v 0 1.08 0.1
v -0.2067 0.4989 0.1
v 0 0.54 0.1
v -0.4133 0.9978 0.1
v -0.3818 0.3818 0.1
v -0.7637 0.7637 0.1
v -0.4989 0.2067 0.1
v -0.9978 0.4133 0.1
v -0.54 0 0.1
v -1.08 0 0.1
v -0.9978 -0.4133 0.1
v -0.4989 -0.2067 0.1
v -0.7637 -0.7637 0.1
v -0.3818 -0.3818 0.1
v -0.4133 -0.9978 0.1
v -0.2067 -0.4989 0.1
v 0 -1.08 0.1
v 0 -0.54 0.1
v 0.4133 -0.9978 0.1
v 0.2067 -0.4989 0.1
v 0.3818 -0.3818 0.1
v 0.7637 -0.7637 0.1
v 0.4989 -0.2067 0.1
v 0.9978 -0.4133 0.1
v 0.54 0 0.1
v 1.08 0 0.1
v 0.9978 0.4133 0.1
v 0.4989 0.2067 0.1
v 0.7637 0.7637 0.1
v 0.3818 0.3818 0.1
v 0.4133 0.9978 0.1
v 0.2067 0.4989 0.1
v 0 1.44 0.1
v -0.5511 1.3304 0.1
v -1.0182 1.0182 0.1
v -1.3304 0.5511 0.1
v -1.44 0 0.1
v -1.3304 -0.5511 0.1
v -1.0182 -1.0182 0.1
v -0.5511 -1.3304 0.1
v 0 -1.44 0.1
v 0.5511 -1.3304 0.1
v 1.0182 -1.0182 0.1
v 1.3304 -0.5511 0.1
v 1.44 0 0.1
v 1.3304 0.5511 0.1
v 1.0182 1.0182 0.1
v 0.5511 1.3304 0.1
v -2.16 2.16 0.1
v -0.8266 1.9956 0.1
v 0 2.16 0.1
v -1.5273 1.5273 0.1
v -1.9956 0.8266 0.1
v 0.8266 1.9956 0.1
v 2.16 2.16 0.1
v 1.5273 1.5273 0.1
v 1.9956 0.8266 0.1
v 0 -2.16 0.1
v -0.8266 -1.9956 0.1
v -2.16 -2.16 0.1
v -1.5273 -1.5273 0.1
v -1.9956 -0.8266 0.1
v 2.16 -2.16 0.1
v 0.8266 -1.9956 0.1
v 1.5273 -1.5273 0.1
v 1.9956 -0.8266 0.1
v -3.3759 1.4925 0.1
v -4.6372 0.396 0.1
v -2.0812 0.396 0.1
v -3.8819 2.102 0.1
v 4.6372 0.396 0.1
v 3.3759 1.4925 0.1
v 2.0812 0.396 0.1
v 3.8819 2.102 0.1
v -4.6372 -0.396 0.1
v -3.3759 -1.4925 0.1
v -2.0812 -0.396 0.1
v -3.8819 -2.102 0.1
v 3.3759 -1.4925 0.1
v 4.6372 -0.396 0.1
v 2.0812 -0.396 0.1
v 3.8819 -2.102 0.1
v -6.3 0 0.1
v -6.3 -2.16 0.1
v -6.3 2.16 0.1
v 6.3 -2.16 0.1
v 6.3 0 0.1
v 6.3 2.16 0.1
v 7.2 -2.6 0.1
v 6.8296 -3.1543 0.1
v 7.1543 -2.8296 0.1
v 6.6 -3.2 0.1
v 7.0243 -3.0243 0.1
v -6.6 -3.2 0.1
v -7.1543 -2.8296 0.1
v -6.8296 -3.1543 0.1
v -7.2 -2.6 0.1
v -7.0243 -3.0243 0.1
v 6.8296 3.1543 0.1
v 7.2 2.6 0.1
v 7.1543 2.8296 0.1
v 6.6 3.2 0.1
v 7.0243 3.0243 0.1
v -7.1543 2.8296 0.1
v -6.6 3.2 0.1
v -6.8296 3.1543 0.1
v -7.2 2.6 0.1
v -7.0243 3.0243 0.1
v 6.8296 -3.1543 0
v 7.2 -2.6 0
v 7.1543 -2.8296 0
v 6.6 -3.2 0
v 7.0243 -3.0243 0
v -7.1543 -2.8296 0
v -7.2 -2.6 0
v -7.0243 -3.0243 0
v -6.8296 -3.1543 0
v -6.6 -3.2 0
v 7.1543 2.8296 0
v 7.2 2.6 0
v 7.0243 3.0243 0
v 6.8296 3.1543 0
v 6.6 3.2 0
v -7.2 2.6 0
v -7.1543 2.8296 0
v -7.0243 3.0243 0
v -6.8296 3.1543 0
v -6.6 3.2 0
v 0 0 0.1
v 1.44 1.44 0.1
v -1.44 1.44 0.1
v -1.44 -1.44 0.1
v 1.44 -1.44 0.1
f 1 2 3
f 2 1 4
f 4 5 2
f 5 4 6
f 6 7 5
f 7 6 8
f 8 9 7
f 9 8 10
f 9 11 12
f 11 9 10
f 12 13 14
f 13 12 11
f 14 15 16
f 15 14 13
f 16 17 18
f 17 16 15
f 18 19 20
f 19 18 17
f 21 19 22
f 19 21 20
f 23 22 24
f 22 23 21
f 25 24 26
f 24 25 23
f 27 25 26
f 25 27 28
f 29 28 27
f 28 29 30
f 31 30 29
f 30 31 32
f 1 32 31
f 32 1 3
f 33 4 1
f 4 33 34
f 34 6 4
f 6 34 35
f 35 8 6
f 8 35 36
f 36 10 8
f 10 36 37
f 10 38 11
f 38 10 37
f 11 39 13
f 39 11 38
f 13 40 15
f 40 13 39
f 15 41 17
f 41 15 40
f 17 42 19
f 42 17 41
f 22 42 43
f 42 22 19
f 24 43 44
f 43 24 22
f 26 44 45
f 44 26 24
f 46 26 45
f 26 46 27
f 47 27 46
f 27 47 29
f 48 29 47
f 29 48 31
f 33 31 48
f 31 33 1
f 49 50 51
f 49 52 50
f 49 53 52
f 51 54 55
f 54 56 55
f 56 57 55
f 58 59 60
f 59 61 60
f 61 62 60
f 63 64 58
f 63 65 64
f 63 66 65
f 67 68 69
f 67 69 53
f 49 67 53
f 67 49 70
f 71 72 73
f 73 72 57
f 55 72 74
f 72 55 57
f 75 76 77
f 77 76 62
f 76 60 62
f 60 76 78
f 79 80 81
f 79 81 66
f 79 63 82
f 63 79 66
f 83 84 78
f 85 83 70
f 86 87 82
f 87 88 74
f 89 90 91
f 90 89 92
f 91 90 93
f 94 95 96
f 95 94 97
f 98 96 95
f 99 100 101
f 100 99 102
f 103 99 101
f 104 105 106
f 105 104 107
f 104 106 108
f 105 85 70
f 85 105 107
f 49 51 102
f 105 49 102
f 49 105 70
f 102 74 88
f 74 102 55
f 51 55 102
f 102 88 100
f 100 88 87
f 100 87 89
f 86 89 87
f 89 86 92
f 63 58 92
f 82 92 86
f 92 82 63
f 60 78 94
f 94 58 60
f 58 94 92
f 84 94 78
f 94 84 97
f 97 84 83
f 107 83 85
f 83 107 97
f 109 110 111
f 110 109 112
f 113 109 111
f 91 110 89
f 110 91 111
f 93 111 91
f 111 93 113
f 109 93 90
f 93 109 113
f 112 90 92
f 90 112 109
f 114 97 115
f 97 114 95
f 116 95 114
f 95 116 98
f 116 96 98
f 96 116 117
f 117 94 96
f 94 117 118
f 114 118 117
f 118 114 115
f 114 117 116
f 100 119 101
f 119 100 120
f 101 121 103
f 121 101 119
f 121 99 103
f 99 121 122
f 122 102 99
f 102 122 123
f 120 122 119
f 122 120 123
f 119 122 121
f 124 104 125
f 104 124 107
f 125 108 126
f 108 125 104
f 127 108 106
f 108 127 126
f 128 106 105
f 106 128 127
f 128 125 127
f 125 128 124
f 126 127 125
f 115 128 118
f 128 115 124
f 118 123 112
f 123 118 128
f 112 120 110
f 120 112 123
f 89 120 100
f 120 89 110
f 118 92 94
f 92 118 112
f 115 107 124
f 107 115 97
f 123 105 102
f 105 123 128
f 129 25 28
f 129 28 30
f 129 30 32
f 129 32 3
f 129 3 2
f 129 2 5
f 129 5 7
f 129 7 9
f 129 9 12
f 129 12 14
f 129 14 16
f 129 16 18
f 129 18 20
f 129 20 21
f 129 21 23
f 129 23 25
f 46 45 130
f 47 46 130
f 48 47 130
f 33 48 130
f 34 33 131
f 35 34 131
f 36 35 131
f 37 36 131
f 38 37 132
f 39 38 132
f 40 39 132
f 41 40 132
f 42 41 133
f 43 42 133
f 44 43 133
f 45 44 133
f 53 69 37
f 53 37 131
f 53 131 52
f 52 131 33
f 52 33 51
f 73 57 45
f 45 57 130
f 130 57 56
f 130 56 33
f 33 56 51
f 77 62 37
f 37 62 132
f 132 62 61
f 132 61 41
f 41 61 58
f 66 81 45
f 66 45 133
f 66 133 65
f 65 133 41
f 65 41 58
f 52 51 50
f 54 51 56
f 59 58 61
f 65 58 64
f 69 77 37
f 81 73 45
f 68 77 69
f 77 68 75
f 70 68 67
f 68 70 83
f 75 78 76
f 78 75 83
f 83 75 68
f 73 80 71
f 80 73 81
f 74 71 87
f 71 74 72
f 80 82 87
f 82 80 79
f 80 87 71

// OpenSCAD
// file: ../p/empty.scad
use <../lib.scad>
function ldraw_lib__empty() = [
// 0 Empty
// 0 Name: empty.dat
// 0 Author: Steffen [Steffen]
// 0 !LDRAW_ORG Primitive UPDATE 2015-01
// 0 !LICENSE Licensed under CC BY 4.0 : see CAreadme.txt
// 
// 0 BFC CERTIFY CCW
  [0,"BFC","CERTIFY"],
  [0,"BFC","CCW"],
// 
// 0 !HISTORY 2015-10-11 [PTadmin] Official Update 2015-01
// 
// 
// 0 // // Tool MLCad cannot handle really empty files. This file is used as a workaround.
// 0 // // It exceptionally contains forbidden non-LDRAW standard syntax to satisfy MLCad until it is fixed OR a different editor has become the de-facto LDRAW standard.
// 0 // // The line being used here is an "impossible" conditional line which never should be visible,
// 0 // // additionally hidden by a syntax explicitly hiding it from displaying.
// 
// 0 // MLCAD HIDE 5 24 0 0 0 0.0001 0 0 0.0001 -0.0001 0 0 0 0
];
module ldraw_lib__empty(step=0, col=false, unit=2/5, alt=false, line=0.2, solid=!$preview)
    makepoly(ldraw_lib__empty(), step=step, col=col, unit=unit, alt=alt, line=line, solid=solid);
ldraw_lib__empty(line=0.2);
// file: ../p/4-4ndis.scad
use <../lib.scad>
function ldraw_lib__4_4ndis() = [
// 0 Disc Negative 1.0
// 0 Name: 4-4ndis.dat
// 0 Author: James Jessiman
// 0 !LDRAW_ORG Primitive UPDATE 2012-01
// 0 !LICENSE Licensed under CC BY 4.0 : see CAreadme.txt
// 
// 0 BFC CERTIFY CCW
  [0,"BFC","CERTIFY"],
  [0,"BFC","CCW"],
// 
// 0 !HISTORY 2002-03-23 [sbliss] Added BFC statement; compacted code
// 0 !HISTORY 2002-04-25 [PTadmin] Official Update 2002-02
// 0 !HISTORY 2007-06-24 [PTadmin] Header formatted for Contributor Agreement
// 0 !HISTORY 2008-07-01 [PTadmin] Official Update 2008-01
// 0 !HISTORY 2012-02-16 [Philo] Changed to CCW
// 0 !HISTORY 2012-03-30 [PTadmin] Official Update 2012-01
// 
// 
// 3 16 0.9239 0 0.3827 1 0 0 1 0 1
  [3,16,0.9239,0,0.3827,1,0,0,1,0,1],
// 3 16 0.7071 0 0.7071 0.9239 0 0.3827 1 0 1
  [3,16,0.7071,0,0.7071,0.9239,0,0.3827,1,0,1],
// 3 16 0.3827 0 0.9239 0.7071 0 0.7071 1 0 1
  [3,16,0.3827,0,0.9239,0.7071,0,0.7071,1,0,1],
// 3 16 0 0 1 0.3827 0 0.9239 1 0 1
  [3,16,0,0,1,0.3827,0,0.9239,1,0,1],
// 3 16 -0.3827 0 0.9239 0 0 1 -1 0 1
  [3,16,-0.3827,0,0.9239,0,0,1,-1,0,1],
// 3 16 -0.7071 0 0.7071 -0.3827 0 0.9239 -1 0 1
  [3,16,-0.7071,0,0.7071,-0.3827,0,0.9239,-1,0,1],
// 3 16 -0.9239 0 0.3827 -0.7071 0 0.7071 -1 0 1
  [3,16,-0.9239,0,0.3827,-0.7071,0,0.7071,-1,0,1],
// 3 16 -1 0 0 -0.9239 0 0.3827 -1 0 1
  [3,16,-1,0,0,-0.9239,0,0.3827,-1,0,1],
// 3 16 -0.9239 0 -0.3827 -1 0 0 -1 0 -1
  [3,16,-0.9239,0,-0.3827,-1,0,0,-1,0,-1],
// 3 16 -0.7071 0 -0.7071 -0.9239 0 -0.3827 -1 0 -1
  [3,16,-0.7071,0,-0.7071,-0.9239,0,-0.3827,-1,0,-1],
// 3 16 -0.3827 0 -0.9239 -0.7071 0 -0.7071 -1 0 -1
  [3,16,-0.3827,0,-0.9239,-0.7071,0,-0.7071,-1,0,-1],
// 3 16 0 0 -1 -0.3827 0 -0.9239 -1 0 -1
  [3,16,0,0,-1,-0.3827,0,-0.9239,-1,0,-1],
// 3 16 0.3827 0 -0.9239 0 0 -1 1 0 -1
  [3,16,0.3827,0,-0.9239,0,0,-1,1,0,-1],
// 3 16 0.7071 0 -0.7071 0.3827 0 -0.9239 1 0 -1
  [3,16,0.7071,0,-0.7071,0.3827,0,-0.9239,1,0,-1],
// 3 16 0.9239 0 -0.3827 0.7071 0 -0.7071 1 0 -1
  [3,16,0.9239,0,-0.3827,0.7071,0,-0.7071,1,0,-1],
// 3 16 1 0 0 0.9239 0 -0.3827 1 0 -1
  [3,16,1,0,0,0.9239,0,-0.3827,1,0,-1],
];
module ldraw_lib__4_4ndis(step=0, col=false, unit=2/5, alt=false, line=0.2, solid=!$preview)
    makepoly(ldraw_lib__4_4ndis(), step=step, col=col, unit=unit, alt=alt, line=line, solid=solid);
ldraw_lib__4_4ndis(line=0.2);
// file: ../p/4-4disc.scad
use <../lib.scad>
function ldraw_lib__4_4disc() = [
// 0 Disc 1.0
// 0 Name: 4-4disc.dat
// 0 Author: James Jessiman
// 0 !LDRAW_ORG Primitive UPDATE 2002-02
// 0 !LICENSE Licensed under CC BY 4.0 : see CAreadme.txt
// 
// 0 BFC CERTIFY CCW
  [0,"BFC","CERTIFY"],
  [0,"BFC","CCW"],
// 
// 0 !HISTORY 1998-12-15 [PTadmin] Official Update 1998-10
// 0 !HISTORY 2002-03-23 [sbliss] Added BFC statement
// 0 !HISTORY 2002-04-25 [PTadmin] Official Update 2002-02
// 0 !HISTORY 2007-06-24 [PTadmin] Header formatted for Contributor Agreement
// 0 !HISTORY 2008-07-01 [PTadmin] Official Update 2008-01
// 
// 
// 3 16 0 0 0 1 0 0 0.9239 0 0.3827
  [3,16,0,0,0,1,0,0,0.9239,0,0.3827],
// 3 16 0 0 0 0.9239 0 0.3827 0.7071 0 0.7071
  [3,16,0,0,0,0.9239,0,0.3827,0.7071,0,0.7071],
// 3 16 0 0 0 0.7071 0 0.7071 0.3827 0 0.9239
  [3,16,0,0,0,0.7071,0,0.7071,0.3827,0,0.9239],
// 3 16 0 0 0 0.3827 0 0.9239 0 0 1
  [3,16,0,0,0,0.3827,0,0.9239,0,0,1],
// 3 16 0 0 0 0 0 1 -0.3827 0 0.9239
  [3,16,0,0,0,0,0,1,-0.3827,0,0.9239],
// 3 16 0 0 0 -0.3827 0 0.9239 -0.7071 0 0.7071
  [3,16,0,0,0,-0.3827,0,0.9239,-0.7071,0,0.7071],
// 3 16 0 0 0 -0.7071 0 0.7071 -0.9239 0 0.3827
  [3,16,0,0,0,-0.7071,0,0.7071,-0.9239,0,0.3827],
// 3 16 0 0 0 -0.9239 0 0.3827 -1 0 -0
  [3,16,0,0,0,-0.9239,0,0.3827,-1,0,-0],
// 3 16 0 0 0 -1 0 -0 -0.9239 0 -0.3827
  [3,16,0,0,0,-1,0,-0,-0.9239,0,-0.3827],
// 3 16 0 0 0 -0.9239 0 -0.3827 -0.7071 0 -0.7071
  [3,16,0,0,0,-0.9239,0,-0.3827,-0.7071,0,-0.7071],
// 3 16 0 0 0 -0.7071 0 -0.7071 -0.3827 0 -0.9239
  [3,16,0,0,0,-0.7071,0,-0.7071,-0.3827,0,-0.9239],
// 3 16 0 0 0 -0.3827 0 -0.9239 0 0 -1
  [3,16,0,0,0,-0.3827,0,-0.9239,0,0,-1],
// 3 16 0 0 0 0 0 -1 0.3827 0 -0.9239
  [3,16,0,0,0,0,0,-1,0.3827,0,-0.9239],
// 3 16 0 0 0 0.3827 0 -0.9239 0.7071 0 -0.7071
  [3,16,0,0,0,0.3827,0,-0.9239,0.7071,0,-0.7071],
// 3 16 0 0 0 0.7071 0 -0.7071 0.9239 0 -0.3827
  [3,16,0,0,0,0.7071,0,-0.7071,0.9239,0,-0.3827],
// 3 16 0 0 0 0.9239 0 -0.3827 1 0 0
  [3,16,0,0,0,0.9239,0,-0.3827,1,0,0],
// 0
];
module ldraw_lib__4_4disc(step=0, col=false, unit=2/5, alt=false, line=0.2, solid=!$preview)
    makepoly(ldraw_lib__4_4disc(), step=step, col=col, unit=unit, alt=alt, line=line, solid=solid);
ldraw_lib__4_4disc(line=0.2);
// file: ../p/1-8chrd.scad
use <../lib.scad>
function ldraw_lib__1_8chrd() = [
// 0 Chord 0.125
// 0 Name: 1-8chrd.dat
// 0 Author: Orion Pobursky [OrionP]
// 0 !LDRAW_ORG Primitive UPDATE 2023-05
// 0 !LICENSE Licensed under CC BY 4.0 : see CAreadme.txt
// 
// 0 BFC CERTIFY CCW
  [0,"BFC","CERTIFY"],
  [0,"BFC","CCW"],
// 
// 0 !HISTORY 2004-04-22 [PTadmin] Official Update 2004-02
// 0 !HISTORY 2007-06-22 [PTadmin] Header formatted for Contributor Agreement
// 0 !HISTORY 2008-07-01 [PTadmin] Official Update 2008-01
// 0 !HISTORY 2023-10-27 [OrionP] Rebuilt with PrimGen2, original author westrate
// 0 !HISTORY 2023-10-31 [OrionP] Official Update 2023-05
// 
// 3 16 1 0 0 0.9239 0 0.3827 0.7071 0 0.7071
  [3,16,1,0,0,0.9239,0,0.3827,0.7071,0,0.7071],
];
module ldraw_lib__1_8chrd(step=0, col=false, unit=2/5, alt=false, line=0.2, solid=!$preview)
    makepoly(ldraw_lib__1_8chrd(), step=step, col=col, unit=unit, alt=alt, line=line, solid=solid);
ldraw_lib__1_8chrd(line=0.2);
// file: ../p/1-16chrd.scad
use <../lib.scad>
use <empty.scad>
function ldraw_lib__1_16chrd() = [
// 0 Chord 0.0625
// 0 Name: 1-16chrd.dat
// 0 Author: Philippe Hurbain [Philo]
// 0 !LDRAW_ORG Primitive UPDATE 2015-01
// 0 !LICENSE Licensed under CC BY 4.0 : see CAreadme.txt
// 
// 0 BFC CERTIFY CCW
  [0,"BFC","CERTIFY"],
  [0,"BFC","CCW"],
// 
// 0 !HISTORY 2015-10-11 [PTadmin] Official Update 2015-01
// 
// 
// 0 // This file is intentionally empty because at the current \P resolution,
// 0 // an 1-16chrd is actually empty. However, this file still is present
// 0 // to allow tools to do primitives substition and fill in a real chrd here,
// 0 // or, if desired, to substitute this with the hi-res 48\1-16chrd.
// 
// 0 // This file is based on an idea by Darats at http://forums.ldraw.org/read.php?19,14500,14500#msg-14500
// 
// 1 16 0 0 0 1 0 0 0 1 0 0 0 1 empty.dat
  [1,16,0,0,0,1,0,0,0,1,0,0,0,1, ldraw_lib__empty()],
];
module ldraw_lib__1_16chrd(step=0, col=false, unit=2/5, alt=false, line=0.2, solid=!$preview)
    makepoly(ldraw_lib__1_16chrd(), step=step, col=col, unit=unit, alt=alt, line=line, solid=solid);
ldraw_lib__1_16chrd(line=0.2);
// file: ../p/4-4ring3.scad
use <../lib.scad>
function ldraw_lib__4_4ring3() = [
// 0 Ring  3 x 1.0
// 0 Name: 4-4ring3.dat
// 0 Author: James Jessiman
// 0 !LDRAW_ORG Primitive UPDATE 2009-01
// 0 !LICENSE Licensed under CC BY 4.0 : see CAreadme.txt
// 
// 0 BFC CERTIFY CCW
  [0,"BFC","CERTIFY"],
  [0,"BFC","CCW"],
// 
// 0 !HISTORY 1998-12-15 [PTadmin] Official Update 1998-10
// 0 !HISTORY 2002-04-05 [hafhead] Added BFC statement
// 0 !HISTORY 2002-04-25 [PTadmin] Official Update 2002-02
// 0 !HISTORY 2007-06-24 [PTadmin] Header formatted for Contributor Agreement
// 0 !HISTORY 2008-07-01 [PTadmin] Official Update 2008-01
// 0 !HISTORY 2008-08-26 [cwdee] Switch polygon winding and rename
// 0 !HISTORY 2009-05-02 [PTadmin] Official Update 2009-01
// 
// 
// 4 16 -1.5308 0 3.6956 -1.1481 0 2.7717 0 0 3 0 0 4
  [4,16,-1.5308,0,3.6956,-1.1481,0,2.7717,0,0,3,0,0,4],
// 4 16 -2.8284 0 2.8284 -2.1213 0 2.1213 -1.1481 0 2.7717 -1.5308 0 3.6956
  [4,16,-2.8284,0,2.8284,-2.1213,0,2.1213,-1.1481,0,2.7717,-1.5308,0,3.6956],
// 4 16 -3.6956 0 1.5308 -2.7717 0 1.1481 -2.1213 0 2.1213 -2.8284 0 2.8284
  [4,16,-3.6956,0,1.5308,-2.7717,0,1.1481,-2.1213,0,2.1213,-2.8284,0,2.8284],
// 4 16 -4 0 0 -3 0 0 -2.7717 0 1.1481 -3.6956 0 1.5308
  [4,16,-4,0,0,-3,0,0,-2.7717,0,1.1481,-3.6956,0,1.5308],
// 4 16 -3.6956 0 -1.5308 -2.7717 0 -1.1481 -3 0 0 -4 0 0
  [4,16,-3.6956,0,-1.5308,-2.7717,0,-1.1481,-3,0,0,-4,0,0],
// 4 16 -2.8284 0 -2.8284 -2.1213 0 -2.1213 -2.7717 0 -1.1481 -3.6956 0 -1.5308
  [4,16,-2.8284,0,-2.8284,-2.1213,0,-2.1213,-2.7717,0,-1.1481,-3.6956,0,-1.5308],
// 4 16 -1.5308 0 -3.6956 -1.1481 0 -2.7717 -2.1213 0 -2.1213 -2.8284 0 -2.8284
  [4,16,-1.5308,0,-3.6956,-1.1481,0,-2.7717,-2.1213,0,-2.1213,-2.8284,0,-2.8284],
// 4 16 0 0 -4 0 0 -3 -1.1481 0 -2.7717 -1.5308 0 -3.6956
  [4,16,0,0,-4,0,0,-3,-1.1481,0,-2.7717,-1.5308,0,-3.6956],
// 4 16 1.5308 0 -3.6956 1.1481 0 -2.7717 0 0 -3 0 0 -4
  [4,16,1.5308,0,-3.6956,1.1481,0,-2.7717,0,0,-3,0,0,-4],
// 4 16 2.8284 0 -2.8284 2.1213 0 -2.1213 1.1481 0 -2.7717 1.5308 0 -3.6956
  [4,16,2.8284,0,-2.8284,2.1213,0,-2.1213,1.1481,0,-2.7717,1.5308,0,-3.6956],
// 4 16 3.6956 0 -1.5308 2.7717 0 -1.1481 2.1213 0 -2.1213 2.8284 0 -2.8284
  [4,16,3.6956,0,-1.5308,2.7717,0,-1.1481,2.1213,0,-2.1213,2.8284,0,-2.8284],
// 4 16 4 0 0 3 0 0 2.7717 0 -1.1481 3.6956 0 -1.5308
  [4,16,4,0,0,3,0,0,2.7717,0,-1.1481,3.6956,0,-1.5308],
// 4 16 3.6956 0 1.5308 2.7717 0 1.1481 3 0 0 4 0 0
  [4,16,3.6956,0,1.5308,2.7717,0,1.1481,3,0,0,4,0,0],
// 4 16 2.8284 0 2.8284 2.1213 0 2.1213 2.7717 0 1.1481 3.6956 0 1.5308
  [4,16,2.8284,0,2.8284,2.1213,0,2.1213,2.7717,0,1.1481,3.6956,0,1.5308],
// 4 16 1.5308 0 3.6956 1.1481 0 2.7717 2.1213 0 2.1213 2.8284 0 2.8284
  [4,16,1.5308,0,3.6956,1.1481,0,2.7717,2.1213,0,2.1213,2.8284,0,2.8284],
// 4 16 0 0 4 0 0 3 1.1481 0 2.7717 1.5308 0 3.6956
  [4,16,0,0,4,0,0,3,1.1481,0,2.7717,1.5308,0,3.6956],
// 0
];
module ldraw_lib__4_4ring3(step=0, col=false, unit=2/5, alt=false, line=0.2, solid=!$preview)
    makepoly(ldraw_lib__4_4ring3(), step=step, col=col, unit=unit, alt=alt, line=line, solid=solid);
ldraw_lib__4_4ring3(line=0.2);
// file: ../p/4-4ring1.scad
use <../lib.scad>
function ldraw_lib__4_4ring1() = [
// 0 Ring  1 x 1.0
// 0 Name: 4-4ring1.dat
// 0 Author: James Jessiman
// 0 !LDRAW_ORG Primitive UPDATE 2009-01
// 0 !LICENSE Licensed under CC BY 4.0 : see CAreadme.txt
// 
// 0 BFC CERTIFY CCW
  [0,"BFC","CERTIFY"],
  [0,"BFC","CCW"],
// 
// 0 !HISTORY 1998-12-15 [PTadmin] Official Update 1998-10
// 0 !HISTORY 2002-04-08 [BrickCaster] Modified for BFC compliance
// 0 !HISTORY 2002-04-25 [PTadmin] Official Update 2002-02
// 0 !HISTORY 2007-06-24 [PTadmin] Header formatted for Contributor Agreement
// 0 !HISTORY 2008-07-01 [PTadmin] Official Update 2008-01
// 0 !HISTORY 2008-08-26 [cwdee] Switch polygon winding and rename
// 0 !HISTORY 2009-05-02 [PTadmin] Official Update 2009-01
// 
// 
// 4 16 -0.7654 0 1.8478 -0.3827 0 0.9239 0 0 1 0 0 2
  [4,16,-0.7654,0,1.8478,-0.3827,0,0.9239,0,0,1,0,0,2],
// 4 16 -1.4142 0 1.4142 -0.7071 0 0.7071 -0.3827 0 0.9239 -0.7654 0 1.8478
  [4,16,-1.4142,0,1.4142,-0.7071,0,0.7071,-0.3827,0,0.9239,-0.7654,0,1.8478],
// 4 16 -1.8478 0 0.7654 -0.9239 0 0.3827 -0.7071 0 0.7071 -1.4142 0 1.41420
  [4,16,-1.8478,0,0.7654,-0.9239,0,0.3827,-0.7071,0,0.7071,-1.4142,0,1.41420],
// 4 16 -2 0 0 -1 0 0 -0.9239 0 0.3827 -1.8478 0 0.7654
  [4,16,-2,0,0,-1,0,0,-0.9239,0,0.3827,-1.8478,0,0.7654],
// 4 16 -1.8478 0 -0.7654 -0.9239 0 -0.3827 -1 0 0 -2 0 0
  [4,16,-1.8478,0,-0.7654,-0.9239,0,-0.3827,-1,0,0,-2,0,0],
// 4 16 -1.4142 0 -1.4142 -0.7071 0 -0.7071 -0.9239 0 -0.3827 -1.8478 0 -0.7654
  [4,16,-1.4142,0,-1.4142,-0.7071,0,-0.7071,-0.9239,0,-0.3827,-1.8478,0,-0.7654],
// 4 16 -0.7654 0 -1.8478 -0.3827 0 -0.9239 -0.7071 0 -0.7071 -1.4142 0 -1.4142
  [4,16,-0.7654,0,-1.8478,-0.3827,0,-0.9239,-0.7071,0,-0.7071,-1.4142,0,-1.4142],
// 4 16 0 0 -2 0 0 -1 -0.3827 0 -0.9239 -0.7654 0 -1.8478
  [4,16,0,0,-2,0,0,-1,-0.3827,0,-0.9239,-0.7654,0,-1.8478],
// 4 16 0.7654 0 -1.8478 0.3827 0 -0.9239 0 0 -1 0 0 -2
  [4,16,0.7654,0,-1.8478,0.3827,0,-0.9239,0,0,-1,0,0,-2],
// 4 16 1.4142 0 -1.4142 0.7071 0 -0.7071 0.3827 0 -0.9239 0.7654 0 -1.8478
  [4,16,1.4142,0,-1.4142,0.7071,0,-0.7071,0.3827,0,-0.9239,0.7654,0,-1.8478],
// 4 16 1.8478 0 -0.7654 0.9239 0 -0.3827 0.7071 0 -0.7071 1.4142 0 -1.4142
  [4,16,1.8478,0,-0.7654,0.9239,0,-0.3827,0.7071,0,-0.7071,1.4142,0,-1.4142],
// 4 16 2 0 0 1 0 0 0.9239 0 -0.3827 1.8478 0 -0.7654
  [4,16,2,0,0,1,0,0,0.9239,0,-0.3827,1.8478,0,-0.7654],
// 4 16 1.8478 0 0.7654 0.9239 0 0.3827 1 0 0 2 0 0
  [4,16,1.8478,0,0.7654,0.9239,0,0.3827,1,0,0,2,0,0],
// 4 16 1.4142 0 1.4142 0.7071 0 0.7071 0.9239 0 0.3827 1.8478 0 0.7654
  [4,16,1.4142,0,1.4142,0.7071,0,0.7071,0.9239,0,0.3827,1.8478,0,0.7654],
// 4 16 0.7654 0 1.8478 0.3827 0 0.9239 0.7071 0 0.7071 1.4142 0 1.4142
  [4,16,0.7654,0,1.8478,0.3827,0,0.9239,0.7071,0,0.7071,1.4142,0,1.4142],
// 4 16 0 0 2 0 0 1 0.3827 0 0.9239 0.7654 0 1.8478
  [4,16,0,0,2,0,0,1,0.3827,0,0.9239,0.7654,0,1.8478],
// 0
];
module ldraw_lib__4_4ring1(step=0, col=false, unit=2/5, alt=false, line=0.2, solid=!$preview)
    makepoly(ldraw_lib__4_4ring1(), step=step, col=col, unit=unit, alt=alt, line=line, solid=solid);
ldraw_lib__4_4ring1(line=0.2);
// file: ../p/3-16ndis.scad
use <../lib.scad>
function ldraw_lib__3_16ndis() = [
// 0 Disc Negative 0.1875
// 0 Name: 3-16ndis.dat
// 0 Author: Magnus Forsberg [MagFors]
// 0 !LDRAW_ORG Primitive UPDATE 2024-01
// 0 !LICENSE Licensed under CC BY 4.0 : see CAreadme.txt
// 
// 0 BFC CERTIFY CCW
  [0,"BFC","CERTIFY"],
  [0,"BFC","CCW"],
// 
// 0 !HISTORY 2009-05-02 [PTadmin] Official Update 2009-01
// 0 !HISTORY 2024-01-03 [MagFors] Complete regeneration, original by guyvivan
// 0 !HISTORY 2024-01-29 [OrionP] Official Update 2024-01
// 
// 3 16 1 0 1 0.9239 0 0.3827 1 0 0
  [3,16,1,0,1,0.9239,0,0.3827,1,0,0],
// 3 16 1 0 1 0.7071 0 0.7071 0.9239 0 0.3827
  [3,16,1,0,1,0.7071,0,0.7071,0.9239,0,0.3827],
// 3 16 1 0 1 0.3827 0 0.9239 0.7071 0 0.7071
  [3,16,1,0,1,0.3827,0,0.9239,0.7071,0,0.7071],
// 0 // Build by LDPartEditor (PrimGen 2.X)
];
module ldraw_lib__3_16ndis(step=0, col=false, unit=2/5, alt=false, line=0.2, solid=!$preview)
    makepoly(ldraw_lib__3_16ndis(), step=step, col=col, unit=unit, alt=alt, line=line, solid=solid);
ldraw_lib__3_16ndis(line=0.2);
// file: ../p/logo-train-2006.scad
use <../lib.scad>
use <1-16chrd.scad>
use <1-8chrd.scad>
use <4-4disc.scad>
use <4-4ndis.scad>
function ldraw_lib__logo_train_2006() = [
// 0 Logo Train 2006
// 0 Name: logo-train-2006.dat
// 0 Author: Gerald Lasser [GeraldLasser]
// 0 !LDRAW_ORG Primitive UPDATE 2023-07
// 0 !LICENSE Licensed under CC BY 4.0 : see CAreadme.txt
// 
// 0 BFC CERTIFY CCW
  [0,"BFC","CERTIFY"],
  [0,"BFC","CCW"],
// 
// 0 !HISTORY 2023-12-31 [OrionP] Official Update 2023-07
// 
// 
// 1 16 0 -.25 0 3 0 0 0 1 0 0 0 3 4-4disc.dat
  [1,16,0,-.25,0,3,0,0,0,1,0,0,0,3, ldraw_lib__4_4disc()],
// 1 16 0 -.25 0 8 0 0 0 1 0 0 0 8 4-4ndis.dat
  [1,16,0,-.25,0,8,0,0,0,1,0,0,0,8, ldraw_lib__4_4ndis()],
// 3 16 -11.0868 -.25 4.5924 -11.5625 -.25 2.2 -8 -.25 0
  [3,16,-11.0868,-.25,4.5924,-11.5625,-.25,2.2,-8,-.25,0],
// 3 16 -11.0868 -.25 4.5924 -8 -.25 0 -8 -.25 8
  [3,16,-11.0868,-.25,4.5924,-8,-.25,0,-8,-.25,8],
// 3 16 -11.0868 -.25 4.5924 -8 -.25 8 -8.4852 -.25 8.4852
  [3,16,-11.0868,-.25,4.5924,-8,-.25,8,-8.4852,-.25,8.4852],
// 3 16 -8.4852 -.25 8.4852 -8 -.25 8 0 -.25 8
  [3,16,-8.4852,-.25,8.4852,-8,-.25,8,0,-.25,8],
// 3 16 -8.4852 -.25 8.4852 0 -.25 8 0 -.25 12
  [3,16,-8.4852,-.25,8.4852,0,-.25,8,0,-.25,12],
// 3 16 11.5625 -.25 2.2 11.0868 -.25 4.5924 8 -.25 0
  [3,16,11.5625,-.25,2.2,11.0868,-.25,4.5924,8,-.25,0],
// 3 16 8 -.25 0 11.0868 -.25 4.5924 8 -.25 8
  [3,16,8,-.25,0,11.0868,-.25,4.5924,8,-.25,8],
// 3 16 8 -.25 8 11.0868 -.25 4.5924 8.4852 -.25 8.4852
  [3,16,8,-.25,8,11.0868,-.25,4.5924,8.4852,-.25,8.4852],
// 3 16 8 -.25 8 8.4852 -.25 8.4852 0 -.25 8
  [3,16,8,-.25,8,8.4852,-.25,8.4852,0,-.25,8],
// 3 16 0 -.25 8 8.4852 -.25 8.4852 0 -.25 12
  [3,16,0,-.25,8,8.4852,-.25,8.4852,0,-.25,12],
// 
// 3 16 -11.5625 -.25 -2.2 -11.0868 -.25 -4.5924 -8 -.25 0
  [3,16,-11.5625,-.25,-2.2,-11.0868,-.25,-4.5924,-8,-.25,0],
// 3 16 -8 -.25 0 -11.0868 -.25 -4.5924 -8 -.25 -8
  [3,16,-8,-.25,0,-11.0868,-.25,-4.5924,-8,-.25,-8],
// 3 16 -8 -.25 -8 -11.0868 -.25 -4.5924 -8.4852 -.25 -8.4852
  [3,16,-8,-.25,-8,-11.0868,-.25,-4.5924,-8.4852,-.25,-8.4852],
// 3 16 -8 -.25 -8 -8.4852 -.25 -8.4852 0 -.25 -8
  [3,16,-8,-.25,-8,-8.4852,-.25,-8.4852,0,-.25,-8],
// 3 16 0 -.25 -8 -8.4852 -.25 -8.4852 0 -.25 -12
  [3,16,0,-.25,-8,-8.4852,-.25,-8.4852,0,-.25,-12],
// 3 16 11.0868 -.25 -4.5924 11.5625 -.25 -2.2 8 -.25 0
  [3,16,11.0868,-.25,-4.5924,11.5625,-.25,-2.2,8,-.25,0],
// 3 16 11.0868 -.25 -4.5924 8 -.25 0 8 -.25 -8
  [3,16,11.0868,-.25,-4.5924,8,-.25,0,8,-.25,-8],
// 3 16 11.0868 -.25 -4.5924 8 -.25 -8 8.4852 -.25 -8.4852
  [3,16,11.0868,-.25,-4.5924,8,-.25,-8,8.4852,-.25,-8.4852],
// 3 16 8.4852 -.25 -8.4852 8 -.25 -8 0 -.25 -8
  [3,16,8.4852,-.25,-8.4852,8,-.25,-8,0,-.25,-8],
// 3 16 8.4852 -.25 -8.4852 0 -.25 -8 0 -.25 -12
  [3,16,8.4852,-.25,-8.4852,0,-.25,-8,0,-.25,-12],
// 
// 1 16 0 -.25 0 0 0 -12 0 1 0 12 0 0 1-8chrd.dat
  [1,16,0,-.25,0,0,0,-12,0,1,0,12,0,0, ldraw_lib__1_8chrd()],
// 1 16 0 -.25 0 0 0 12 0 1 0 12 0 0 1-8chrd.dat
  [1,16,0,-.25,0,0,0,12,0,1,0,12,0,0, ldraw_lib__1_8chrd()],
// 1 16 0 -.25 0 -8.48528 0 -8.48528 0 1 0 8.48528 0 -8.48528 1-16chrd.dat
  [1,16,0,-.25,0,-8.48528,0,-8.48528,0,1,0,8.48528,0,-8.48528, ldraw_lib__1_16chrd()],
// 1 16 0 -.25 0 8.48528 0 8.48528 0 1 0 8.48528 0 -8.48528 1-16chrd.dat
  [1,16,0,-.25,0,8.48528,0,8.48528,0,1,0,8.48528,0,-8.48528, ldraw_lib__1_16chrd()],
// 1 16 0 -.25 0 0 0 -12 0 1 0 -12 0 0 1-8chrd.dat
  [1,16,0,-.25,0,0,0,-12,0,1,0,-12,0,0, ldraw_lib__1_8chrd()],
// 1 16 0 -.25 0 0 0 12 0 1 0 -12 0 0 1-8chrd.dat
  [1,16,0,-.25,0,0,0,12,0,1,0,-12,0,0, ldraw_lib__1_8chrd()],
// 1 16 0 -.25 0 -8.48528 0 -8.48528 0 1 0 -8.48528 0 8.48528 1-16chrd.dat
  [1,16,0,-.25,0,-8.48528,0,-8.48528,0,1,0,-8.48528,0,8.48528, ldraw_lib__1_16chrd()],
// 1 16 0 -.25 0 8.48528 0 8.48528 0 1 0 -8.48528 0 8.48528 1-16chrd.dat
  [1,16,0,-.25,0,8.48528,0,8.48528,0,1,0,-8.48528,0,8.48528, ldraw_lib__1_16chrd()],
// 
// 3 16 -11.5625 -.25 2.2 -11.5625 -.25 -2.2 -8 -.25 0
  [3,16,-11.5625,-.25,2.2,-11.5625,-.25,-2.2,-8,-.25,0],
// 3 16 11.5625 -.25 -2.2 11.5625 -.25 2.2 8 -.25 0
  [3,16,11.5625,-.25,-2.2,11.5625,-.25,2.2,8,-.25,0],
// 4 16 -25.7625 -.25 2.2 -25.7625 -.25 -2.2 -11.5625 -.25 -2.2 -11.5625 -.25 2.2
  [4,16,-25.7625,-.25,2.2,-25.7625,-.25,-2.2,-11.5625,-.25,-2.2,-11.5625,-.25,2.2],
// 4 16 -35 -.25 0 -25.7625 -.25 2.2 -18.755 -.25 8.2915 -21.5662 -.25 11.6778
  [4,16,-35,-.25,0,-25.7625,-.25,2.2,-18.755,-.25,8.2915,-21.5662,-.25,11.6778],
// 4 16 -18.755 -.25 -8.2915 -25.7625 -.25 -2.2 -35 -.25 0 -21.5662 -.25 -11.6778
  [4,16,-18.755,-.25,-8.2915,-25.7625,-.25,-2.2,-35,-.25,0,-21.5662,-.25,-11.6778],
// 3 16 -35 -.25 0 -25.7625 -.25 -2.2 -25.7625 -.25 2.2
  [3,16,-35,-.25,0,-25.7625,-.25,-2.2,-25.7625,-.25,2.2],
// 4 16 11.5625 -.25 -2.2 25.7625 -.25 -2.2 25.7625 -.25 2.2 11.5625 -.25 2.2
  [4,16,11.5625,-.25,-2.2,25.7625,-.25,-2.2,25.7625,-.25,2.2,11.5625,-.25,2.2],
// 4 16 18.755 -.25 8.2915 25.7625 -.25 2.2 35 -.25 0 21.5662 -.25 11.6778
  [4,16,18.755,-.25,8.2915,25.7625,-.25,2.2,35,-.25,0,21.5662,-.25,11.6778],
// 4 16 35 -.25 0 25.7625 -.25 -2.2 18.755 -.25 -8.2915 21.5662 -.25 -11.6778
  [4,16,35,-.25,0,25.7625,-.25,-2.2,18.755,-.25,-8.2915,21.5662,-.25,-11.6778],
// 3 16 25.7625 -.25 -2.2 35 -.25 0 25.7625 -.25 2.2
  [3,16,25.7625,-.25,-2.2,35,-.25,0,25.7625,-.25,2.2],
];
module ldraw_lib__logo_train_2006(step=0, col=false, unit=2/5, alt=false, line=0.2, solid=!$preview)
    makepoly(ldraw_lib__logo_train_2006(), step=step, col=col, unit=unit, alt=alt, line=line, solid=solid);
ldraw_lib__logo_train_2006(line=0.2);
// file: ../p/logo-train-2006-box.scad
use <../lib.scad>
use <3-16ndis.scad>
use <4-4ring1.scad>
use <4-4ring3.scad>
function ldraw_lib__logo_train_2006_box() = [
// 0 Logo Train 2006 Outer Box
// 0 Name: logo-train-2006-box.dat
// 0 Author: Gerald Lasser [GeraldLasser]
// 0 !LDRAW_ORG Primitive UPDATE 2023-07
// 0 !LICENSE Licensed under CC BY 4.0 : see CAreadme.txt
// 
// 0 BFC CERTIFY CCW
  [0,"BFC","CERTIFY"],
  [0,"BFC","CCW"],
// 
// 0 !HISTORY 2023-12-31 [OrionP] Official Update 2023-07
// 
// 
// 1 16 0 -.25 0 3 0 0 0 1 0 0 0 3 4-4ring1.dat
  [1,16,0,-.25,0,3,0,0,0,1,0,0,0,3, ldraw_lib__4_4ring1()],
// 1 16 0 -.25 0 2 0 0 0 1 0 0 0 2 4-4ring3.dat
  [1,16,0,-.25,0,2,0,0,0,1,0,0,0,2, ldraw_lib__4_4ring3()],
// 1 16 0 -.25 0 0 0 -12 0 1 0 12 0 0 3-16ndis.dat
  [1,16,0,-.25,0,0,0,-12,0,1,0,12,0,0, ldraw_lib__3_16ndis()],
// 1 16 0 -.25 0 0 0 12 0 1 0 12 0 0 3-16ndis.dat
  [1,16,0,-.25,0,0,0,12,0,1,0,12,0,0, ldraw_lib__3_16ndis()],
// 1 16 0 -.25 0 0 0 -12 0 1 0 -12 0 0 3-16ndis.dat
  [1,16,0,-.25,0,0,0,-12,0,1,0,-12,0,0, ldraw_lib__3_16ndis()],
// 1 16 0 -.25 0 0 0 12 0 1 0 -12 0 0 3-16ndis.dat
  [1,16,0,-.25,0,0,0,12,0,1,0,-12,0,0, ldraw_lib__3_16ndis()],
// 
// 3 16 -18.755 -.25 8.2915 -25.7625 -.25 2.2 -11.5625 -.25 2.2
  [3,16,-18.755,-.25,8.2915,-25.7625,-.25,2.2,-11.5625,-.25,2.2],
// 3 16 -18.755 -.25 8.2915 -11.5625 -.25 2.2 -11.0868 -.25 4.5924
  [3,16,-18.755,-.25,8.2915,-11.5625,-.25,2.2,-11.0868,-.25,4.5924],
// 4 16 -12 -.25 12 -21.5662 -.25 11.6778 -18.755 -.25 8.2915 -11.0868 -.25 4.5924
  [4,16,-12,-.25,12,-21.5662,-.25,11.6778,-18.755,-.25,8.2915,-11.0868,-.25,4.5924],
// 3 16 25.7625 -.25 2.2 18.755 -.25 8.2915 11.5625 -.25 2.2
  [3,16,25.7625,-.25,2.2,18.755,-.25,8.2915,11.5625,-.25,2.2],
// 3 16 11.5625 -.25 2.2 18.755 -.25 8.2915 11.0868 -.25 4.5924
  [3,16,11.5625,-.25,2.2,18.755,-.25,8.2915,11.0868,-.25,4.5924],
// 4 16 18.755 -.25 8.2915 21.5662 -.25 11.6778 12 -.25 12 11.0868 -.25 4.5924
  [4,16,18.755,-.25,8.2915,21.5662,-.25,11.6778,12,-.25,12,11.0868,-.25,4.5924],
// 3 16 -25.7625 -.25 -2.2 -18.755 -.25 -8.2915 -11.5625 -.25 -2.2
  [3,16,-25.7625,-.25,-2.2,-18.755,-.25,-8.2915,-11.5625,-.25,-2.2],
// 3 16 -11.5625 -.25 -2.2 -18.755 -.25 -8.2915 -11.0868 -.25 -4.5924
  [3,16,-11.5625,-.25,-2.2,-18.755,-.25,-8.2915,-11.0868,-.25,-4.5924],
// 4 16 -18.755 -.25 -8.2915 -21.5662 -.25 -11.6778 -12 -.25 -12 -11.0868 -.25 -4.5924
  [4,16,-18.755,-.25,-8.2915,-21.5662,-.25,-11.6778,-12,-.25,-12,-11.0868,-.25,-4.5924],
// 3 16 18.755 -.25 -8.2915 25.7625 -.25 -2.2 11.5625 -.25 -2.2
  [3,16,18.755,-.25,-8.2915,25.7625,-.25,-2.2,11.5625,-.25,-2.2],
// 3 16 18.755 -.25 -8.2915 11.5625 -.25 -2.2 11.0868 -.25 -4.5924
  [3,16,18.755,-.25,-8.2915,11.5625,-.25,-2.2,11.0868,-.25,-4.5924],
// 4 16 12 -.25 -12 21.5662 -.25 -11.6778 18.755 -.25 -8.2915 11.0868 -.25 -4.5924
  [4,16,12,-.25,-12,21.5662,-.25,-11.6778,18.755,-.25,-8.2915,11.0868,-.25,-4.5924],
// 
// 3 16 -35 -.25 0 -35 -.25 -12 -21.5662 -.25 -11.6778
  [3,16,-35,-.25,0,-35,-.25,-12,-21.5662,-.25,-11.6778],
// 3 16 -35 -.25 12 -35 -.25 0 -21.5662 -.25 11.6778
  [3,16,-35,-.25,12,-35,-.25,0,-21.5662,-.25,11.6778],
// 3 16 35 -.25 -12 35 -.25 0 21.5662 -.25 -11.6778
  [3,16,35,-.25,-12,35,-.25,0,21.5662,-.25,-11.6778],
// 3 16 35 -.25 0 35 -.25 12 21.5662 -.25 11.6778
  [3,16,35,-.25,0,35,-.25,12,21.5662,-.25,11.6778],
];
module ldraw_lib__logo_train_2006_box(step=0, col=false, unit=2/5, alt=false, line=0.2, solid=!$preview)
    makepoly(ldraw_lib__logo_train_2006_box(), step=step, col=col, unit=unit, alt=alt, line=line, solid=solid);
ldraw_lib__logo_train_2006_box(line=0.2);
// file: ../p/1-4cyli.scad
use <../lib.scad>
function ldraw_lib__1_4cyli() = [
// 0 Cylinder 0.25
// 0 Name: 1-4cyli.dat
// 0 Author: James Jessiman
// 0 !LDRAW_ORG Primitive UPDATE 2012-01
// 0 !LICENSE Licensed under CC BY 4.0 : see CAreadme.txt
// 
// 0 BFC CERTIFY CCW
  [0,"BFC","CERTIFY"],
  [0,"BFC","CCW"],
// 
// 0 !HISTORY 2002-03-23 [sbliss] Added BFC statement.
// 0 !HISTORY 2002-04-25 [PTadmin] Official Update 2002-02
// 0 !HISTORY 2007-06-22 [PTadmin] Header formatted for Contributor Agreement
// 0 !HISTORY 2008-07-01 [PTadmin] Official Update 2008-01
// 0 !HISTORY 2012-02-16 [Philo] Changed to CCW
// 0 !HISTORY 2012-03-30 [PTadmin] Official Update 2012-01
// 
// 
// 4 16 1 1 0 0.9239 1 0.3827 0.9239 0 0.3827 1 0 0
  [4,16,1,1,0,0.9239,1,0.3827,0.9239,0,0.3827,1,0,0],
// 5 24 1 0 0 1 1 0 0.9239 0 0.3827 1 0 -1
  [5,24,1,0,0,1,1,0,0.9239,0,0.3827,1,0,-1],
// 4 16 0.9239 1 0.3827 0.7071 1 0.7071 0.7071 0 0.7071 0.9239 0 0.3827
  [4,16,0.9239,1,0.3827,0.7071,1,0.7071,0.7071,0,0.7071,0.9239,0,0.3827],
// 5 24 0.9239 0 0.3827 0.9239 1 0.3827 0.7071 0 0.7071 1 0 0
  [5,24,0.9239,0,0.3827,0.9239,1,0.3827,0.7071,0,0.7071,1,0,0],
// 4 16 0.7071 1 0.7071 0.3827 1 0.9239 0.3827 0 0.9239 0.7071 0 0.7071
  [4,16,0.7071,1,0.7071,0.3827,1,0.9239,0.3827,0,0.9239,0.7071,0,0.7071],
// 5 24 0.7071 0 0.7071 0.7071 1 0.7071 0.3827 0 0.9239 0.9239 0 0.3827
  [5,24,0.7071,0,0.7071,0.7071,1,0.7071,0.3827,0,0.9239,0.9239,0,0.3827],
// 4 16 0.3827 1 0.9239 0 1 1 0 0 1 0.3827 0 0.9239
  [4,16,0.3827,1,0.9239,0,1,1,0,0,1,0.3827,0,0.9239],
// 5 24 0.3827 0 0.9239 0.3827 1 0.9239 0 0 1 0.7071 0 0.7071
  [5,24,0.3827,0,0.9239,0.3827,1,0.9239,0,0,1,0.7071,0,0.7071],
// 5 24 0 0 1 0 1 1 0.3827 0 0.9239 -1 0 1
  [5,24,0,0,1,0,1,1,0.3827,0,0.9239,-1,0,1],
];
module ldraw_lib__1_4cyli(step=0, col=false, unit=2/5, alt=false, line=0.2, solid=!$preview)
    makepoly(ldraw_lib__1_4cyli(), step=step, col=col, unit=unit, alt=alt, line=line, solid=solid);
ldraw_lib__1_4cyli(line=0.2);
// file: ../p/1-4chrd.scad
use <../lib.scad>
function ldraw_lib__1_4chrd() = [
// 0 Chord 0.25
// 0 Name: 1-4chrd.dat
// 0 Author: Max Martin Richter [MMR1988]
// 0 !LDRAW_ORG Primitive UPDATE 2023-05
// 0 !LICENSE Licensed under CC BY 4.0 : see CAreadme.txt
// 
// 0 BFC CERTIFY CCW
  [0,"BFC","CERTIFY"],
  [0,"BFC","CCW"],
// 
// 0 !HISTORY 2004-04-22 [PTadmin] Official Update 2004-02
// 0 !HISTORY 2007-10-09 [PTadmin] Header formatted for Contributor Agreement
// 0 !HISTORY 2008-07-01 [PTadmin] Official Update 2008-01
// 0 !HISTORY 2012-08-02 [MMR1988] Re-creation with PrimGen2 and Rectifier
// 0 !HISTORY 2012-08-09 [PTadmin] Official Update 2012-02
// 0 !HISTORY 2023-10-27 [OrionP] Change author to MMR1988 from hafhead
// 0 !HISTORY 2023-10-31 [OrionP] Official Update 2023-05
// 
// 4 16 0.9239 0 0.3827 0.3827 0 0.9239 0 0 1 1 0 0
  [4,16,0.9239,0,0.3827,0.3827,0,0.9239,0,0,1,1,0,0],
// 3 16 0.7071 0 0.7071 0.3827 0 0.9239 0.9239 0 0.3827
  [3,16,0.7071,0,0.7071,0.3827,0,0.9239,0.9239,0,0.3827],
];
module ldraw_lib__1_4chrd(step=0, col=false, unit=2/5, alt=false, line=0.2, solid=!$preview)
    makepoly(ldraw_lib__1_4chrd(), step=step, col=col, unit=unit, alt=alt, line=line, solid=solid);
ldraw_lib__1_4chrd(line=0.2);
// main file
use <../lib.scad>
use <../p/1-4chrd.scad>
use <../p/1-4cyli.scad>
use <../p/logo-train-2006-box.scad>
use <../p/logo-train-2006.scad>
function ldraw_lib__6227186g() = [
// 0 Sticker  0.8 x  1.8 with Dark Blue Train Logo
// 0 Name: 6227186g.dat
// 0 Author: David Manley [djm]
// 0 !LDRAW_ORG Part UPDATE 2025-05
// 0 !LICENSE Licensed under CC BY 4.0 : see CAreadme.txt
// 
// 0 BFC CERTIFY CCW
  [0,"BFC","CERTIFY"],
  [0,"BFC","CCW"],
// 
// 0 !KEYWORDS BrickLink 60197stk01, Rebrickable 38761, Set 60197, Train
// 
// 0 !HISTORY 2024-09-25 [GeraldLasser] Complete Rework with Prims
// 0 !HISTORY 2025-05-28 [OrionP] Official Update 2025-05
// 
// 1 16 0 0 0 .45 0 0 0 1 0 0 0 .45 logo-train-2006-box.dat
  [1,16,0,0,0,.45,0,0,0,1,0,0,0,.45, ldraw_lib__logo_train_2006_box()],
// 
// 1 16 16.5 -.25 -6.5 1.5 0 0 0 1 0 0 0 -1.5 1-4chrd.dat
  [1,16,16.5,-.25,-6.5,1.5,0,0,0,1,0,0,0,-1.5, ldraw_lib__1_4chrd()],
// 1 16 -16.5 -.25 -6.5 -1.5 0 0 0 1 0 0 0 -1.5 1-4chrd.dat
  [1,16,-16.5,-.25,-6.5,-1.5,0,0,0,1,0,0,0,-1.5, ldraw_lib__1_4chrd()],
// 1 16 16.5 -.25 6.5 1.5 0 0 0 1 0 0 0 1.5 1-4chrd.dat
  [1,16,16.5,-.25,6.5,1.5,0,0,0,1,0,0,0,1.5, ldraw_lib__1_4chrd()],
// 1 16 -16.5 -.25 6.5 -1.5 0 0 0 1 0 0 0 1.5 1-4chrd.dat
  [1,16,-16.5,-.25,6.5,-1.5,0,0,0,1,0,0,0,1.5, ldraw_lib__1_4chrd()],
// 
// 4 16 -16.5 -.25 8 -18 -.25 6.5 -15.75 -.25 5.4 -9.70479 -.25 5.25501
  [4,16,-16.5,-.25,8,-18,-.25,6.5,-15.75,-.25,5.4,-9.70479,-.25,5.25501],
// 3 16 -5.4 -.25 5.4 0 -.25 5.4 16.5 -.25 8
  [3,16,-5.4,-.25,5.4,0,-.25,5.4,16.5,-.25,8],
// 4 16 16.5 -.25 8 -16.5 -.25 8 -9.70479 -.25 5.25501 -5.4 -.25 5.4
  [4,16,16.5,-.25,8,-16.5,-.25,8,-9.70479,-.25,5.25501,-5.4,-.25,5.4],
// 4 16 15.75 -.25 5.4 16.5 -.25 8 5.4 -.25 5.4 9.70479 -.25 5.25501
  [4,16,15.75,-.25,5.4,16.5,-.25,8,5.4,-.25,5.4,9.70479,-.25,5.25501],
// 3 16 0 -.25 5.4 5.4 -.25 5.4 16.5 -.25 8
  [3,16,0,-.25,5.4,5.4,-.25,5.4,16.5,-.25,8],
// 3 16 16.5 -.25 8 15.75 -.25 5.4 18 -.25 6.5
  [3,16,16.5,-.25,8,15.75,-.25,5.4,18,-.25,6.5],
// 3 16 18 -.25 6.5 15.75 -.25 5.4 15.75 -.25 0
  [3,16,18,-.25,6.5,15.75,-.25,5.4,15.75,-.25,0],
// 3 16 18 -.25 6.5 15.75 -.25 0 18 -.25 -6.5
  [3,16,18,-.25,6.5,15.75,-.25,0,18,-.25,-6.5],
// 4 16 15.75 -.25 0 15.75 -.25 -5.4 16.5 -.25 -8 18 -.25 -6.5
  [4,16,15.75,-.25,0,15.75,-.25,-5.4,16.5,-.25,-8,18,-.25,-6.5],
// 3 16 5.4 -.25 -5.4 0 -.25 -5.4 16.5 -.25 -8
  [3,16,5.4,-.25,-5.4,0,-.25,-5.4,16.5,-.25,-8],
// 4 16 16.5 -.25 -8 15.75 -.25 -5.4 9.70479 -.25 -5.25501 5.4 -.25 -5.4
  [4,16,16.5,-.25,-8,15.75,-.25,-5.4,9.70479,-.25,-5.25501,5.4,-.25,-5.4],
// 3 16 -5.4 -.25 -5.4 -9.70479 -.25 -5.25501 -16.5 -.25 -8
  [3,16,-5.4,-.25,-5.4,-9.70479,-.25,-5.25501,-16.5,-.25,-8],
// 4 16 -16.5 -.25 -8 16.5 -.25 -8 0 -.25 -5.4 -5.4 -.25 -5.4
  [4,16,-16.5,-.25,-8,16.5,-.25,-8,0,-.25,-5.4,-5.4,-.25,-5.4],
// 4 16 -18 -.25 -6.5 -16.5 -.25 -8 -9.70479 -.25 -5.25501 -15.75 -.25 -5.4
  [4,16,-18,-.25,-6.5,-16.5,-.25,-8,-9.70479,-.25,-5.25501,-15.75,-.25,-5.4],
// 3 16 -18 -.25 -6.5 -15.75 -.25 -5.4 -15.75 -.25 0
  [3,16,-18,-.25,-6.5,-15.75,-.25,-5.4,-15.75,-.25,0],
// 4 16 -18 -.25 -6.5 -15.75 -.25 0 -15.75 -.25 5.4 -18 -.25 6.5
  [4,16,-18,-.25,-6.5,-15.75,-.25,0,-15.75,-.25,5.4,-18,-.25,6.5],
// 
// 0 // Sticker Body
// 1 16 16.5 0 -6.5 1.5 0 0 0 -1 0 0 0 -1.5 1-4chrd.dat
  [1,16,16.5,0,-6.5,1.5,0,0,0,-1,0,0,0,-1.5, ldraw_lib__1_4chrd()],
// 1 16 16.5 -.25 -6.5 1.5 0 0 0 .25 0 0 0 -1.5 1-4cyli.dat
  [1,16,16.5,-.25,-6.5,1.5,0,0,0,.25,0,0,0,-1.5, ldraw_lib__1_4cyli()],
// 1 16 -16.5 -.25 -6.5 -1.5 0 0 0 .25 0 0 0 -1.5 1-4cyli.dat
  [1,16,-16.5,-.25,-6.5,-1.5,0,0,0,.25,0,0,0,-1.5, ldraw_lib__1_4cyli()],
// 1 16 -16.5 0 -6.5 -1.5 0 0 0 -1 0 0 0 -1.5 1-4chrd.dat
  [1,16,-16.5,0,-6.5,-1.5,0,0,0,-1,0,0,0,-1.5, ldraw_lib__1_4chrd()],
// 1 16 16.5 -.25 6.5 1.5 0 0 0 .25 0 0 0 1.5 1-4cyli.dat
  [1,16,16.5,-.25,6.5,1.5,0,0,0,.25,0,0,0,1.5, ldraw_lib__1_4cyli()],
// 1 16 16.5 0 6.5 1.5 0 0 0 -1 0 0 0 1.5 1-4chrd.dat
  [1,16,16.5,0,6.5,1.5,0,0,0,-1,0,0,0,1.5, ldraw_lib__1_4chrd()],
// 1 16 -16.5 -.25 6.5 -1.5 0 0 0 .25 0 0 0 1.5 1-4cyli.dat
  [1,16,-16.5,-.25,6.5,-1.5,0,0,0,.25,0,0,0,1.5, ldraw_lib__1_4cyli()],
// 1 16 -16.5 0 6.5 -1.5 0 0 0 -1 0 0 0 1.5 1-4chrd.dat
  [1,16,-16.5,0,6.5,-1.5,0,0,0,-1,0,0,0,1.5, ldraw_lib__1_4chrd()],
// 
// 4 16 -16.5 0 -8 -18 0 -6.5 -18 0 6.5 -16.5 0 8
  [4,16,-16.5,0,-8,-18,0,-6.5,-18,0,6.5,-16.5,0,8],
// 4 16 -16.5 0 -8 -16.5 0 8 16.5 0 8 16.5 0 -8
  [4,16,-16.5,0,-8,-16.5,0,8,16.5,0,8,16.5,0,-8],
// 4 16 18 0 -6.5 16.5 0 -8 16.5 0 8 18 0 6.5
  [4,16,18,0,-6.5,16.5,0,-8,16.5,0,8,18,0,6.5],
// 4 16 18 0 6.5 18 -.25 6.5 18 -.25 -6.5 18 0 -6.5
  [4,16,18,0,6.5,18,-.25,6.5,18,-.25,-6.5,18,0,-6.5],
// 4 16 16.5 0 -8 16.5 -.25 -8 -16.5 -.25 -8 -16.5 0 -8
  [4,16,16.5,0,-8,16.5,-.25,-8,-16.5,-.25,-8,-16.5,0,-8],
// 4 16 -18 0 -6.5 -18 -.25 -6.5 -18 -.25 6.5 -18 0 6.5
  [4,16,-18,0,-6.5,-18,-.25,-6.5,-18,-.25,6.5,-18,0,6.5],
// 4 16 -16.5 0 8 -16.5 -.25 8 16.5 -.25 8 16.5 0 8
  [4,16,-16.5,0,8,-16.5,-.25,8,16.5,-.25,8,16.5,0,8],
// 
// 0 BFC NOCLIP
  [0,"BFC","NOCLIP"],
// 1 272 0 0 0 .45 0 0 0 1 0 0 0 .45 logo-train-2006.dat
  [1,272,0,0,0,.45,0,0,0,1,0,0,0,.45, ldraw_lib__logo_train_2006()],
];
module ldraw_lib__6227186g(step=0, col=false, unit=2/5, alt=false, line=0.2, solid=!$preview)
    makepoly(ldraw_lib__6227186g(), step=step, col=col, unit=unit, alt=alt, line=line, solid=solid);
ldraw_lib__6227186g(line=0.2);
